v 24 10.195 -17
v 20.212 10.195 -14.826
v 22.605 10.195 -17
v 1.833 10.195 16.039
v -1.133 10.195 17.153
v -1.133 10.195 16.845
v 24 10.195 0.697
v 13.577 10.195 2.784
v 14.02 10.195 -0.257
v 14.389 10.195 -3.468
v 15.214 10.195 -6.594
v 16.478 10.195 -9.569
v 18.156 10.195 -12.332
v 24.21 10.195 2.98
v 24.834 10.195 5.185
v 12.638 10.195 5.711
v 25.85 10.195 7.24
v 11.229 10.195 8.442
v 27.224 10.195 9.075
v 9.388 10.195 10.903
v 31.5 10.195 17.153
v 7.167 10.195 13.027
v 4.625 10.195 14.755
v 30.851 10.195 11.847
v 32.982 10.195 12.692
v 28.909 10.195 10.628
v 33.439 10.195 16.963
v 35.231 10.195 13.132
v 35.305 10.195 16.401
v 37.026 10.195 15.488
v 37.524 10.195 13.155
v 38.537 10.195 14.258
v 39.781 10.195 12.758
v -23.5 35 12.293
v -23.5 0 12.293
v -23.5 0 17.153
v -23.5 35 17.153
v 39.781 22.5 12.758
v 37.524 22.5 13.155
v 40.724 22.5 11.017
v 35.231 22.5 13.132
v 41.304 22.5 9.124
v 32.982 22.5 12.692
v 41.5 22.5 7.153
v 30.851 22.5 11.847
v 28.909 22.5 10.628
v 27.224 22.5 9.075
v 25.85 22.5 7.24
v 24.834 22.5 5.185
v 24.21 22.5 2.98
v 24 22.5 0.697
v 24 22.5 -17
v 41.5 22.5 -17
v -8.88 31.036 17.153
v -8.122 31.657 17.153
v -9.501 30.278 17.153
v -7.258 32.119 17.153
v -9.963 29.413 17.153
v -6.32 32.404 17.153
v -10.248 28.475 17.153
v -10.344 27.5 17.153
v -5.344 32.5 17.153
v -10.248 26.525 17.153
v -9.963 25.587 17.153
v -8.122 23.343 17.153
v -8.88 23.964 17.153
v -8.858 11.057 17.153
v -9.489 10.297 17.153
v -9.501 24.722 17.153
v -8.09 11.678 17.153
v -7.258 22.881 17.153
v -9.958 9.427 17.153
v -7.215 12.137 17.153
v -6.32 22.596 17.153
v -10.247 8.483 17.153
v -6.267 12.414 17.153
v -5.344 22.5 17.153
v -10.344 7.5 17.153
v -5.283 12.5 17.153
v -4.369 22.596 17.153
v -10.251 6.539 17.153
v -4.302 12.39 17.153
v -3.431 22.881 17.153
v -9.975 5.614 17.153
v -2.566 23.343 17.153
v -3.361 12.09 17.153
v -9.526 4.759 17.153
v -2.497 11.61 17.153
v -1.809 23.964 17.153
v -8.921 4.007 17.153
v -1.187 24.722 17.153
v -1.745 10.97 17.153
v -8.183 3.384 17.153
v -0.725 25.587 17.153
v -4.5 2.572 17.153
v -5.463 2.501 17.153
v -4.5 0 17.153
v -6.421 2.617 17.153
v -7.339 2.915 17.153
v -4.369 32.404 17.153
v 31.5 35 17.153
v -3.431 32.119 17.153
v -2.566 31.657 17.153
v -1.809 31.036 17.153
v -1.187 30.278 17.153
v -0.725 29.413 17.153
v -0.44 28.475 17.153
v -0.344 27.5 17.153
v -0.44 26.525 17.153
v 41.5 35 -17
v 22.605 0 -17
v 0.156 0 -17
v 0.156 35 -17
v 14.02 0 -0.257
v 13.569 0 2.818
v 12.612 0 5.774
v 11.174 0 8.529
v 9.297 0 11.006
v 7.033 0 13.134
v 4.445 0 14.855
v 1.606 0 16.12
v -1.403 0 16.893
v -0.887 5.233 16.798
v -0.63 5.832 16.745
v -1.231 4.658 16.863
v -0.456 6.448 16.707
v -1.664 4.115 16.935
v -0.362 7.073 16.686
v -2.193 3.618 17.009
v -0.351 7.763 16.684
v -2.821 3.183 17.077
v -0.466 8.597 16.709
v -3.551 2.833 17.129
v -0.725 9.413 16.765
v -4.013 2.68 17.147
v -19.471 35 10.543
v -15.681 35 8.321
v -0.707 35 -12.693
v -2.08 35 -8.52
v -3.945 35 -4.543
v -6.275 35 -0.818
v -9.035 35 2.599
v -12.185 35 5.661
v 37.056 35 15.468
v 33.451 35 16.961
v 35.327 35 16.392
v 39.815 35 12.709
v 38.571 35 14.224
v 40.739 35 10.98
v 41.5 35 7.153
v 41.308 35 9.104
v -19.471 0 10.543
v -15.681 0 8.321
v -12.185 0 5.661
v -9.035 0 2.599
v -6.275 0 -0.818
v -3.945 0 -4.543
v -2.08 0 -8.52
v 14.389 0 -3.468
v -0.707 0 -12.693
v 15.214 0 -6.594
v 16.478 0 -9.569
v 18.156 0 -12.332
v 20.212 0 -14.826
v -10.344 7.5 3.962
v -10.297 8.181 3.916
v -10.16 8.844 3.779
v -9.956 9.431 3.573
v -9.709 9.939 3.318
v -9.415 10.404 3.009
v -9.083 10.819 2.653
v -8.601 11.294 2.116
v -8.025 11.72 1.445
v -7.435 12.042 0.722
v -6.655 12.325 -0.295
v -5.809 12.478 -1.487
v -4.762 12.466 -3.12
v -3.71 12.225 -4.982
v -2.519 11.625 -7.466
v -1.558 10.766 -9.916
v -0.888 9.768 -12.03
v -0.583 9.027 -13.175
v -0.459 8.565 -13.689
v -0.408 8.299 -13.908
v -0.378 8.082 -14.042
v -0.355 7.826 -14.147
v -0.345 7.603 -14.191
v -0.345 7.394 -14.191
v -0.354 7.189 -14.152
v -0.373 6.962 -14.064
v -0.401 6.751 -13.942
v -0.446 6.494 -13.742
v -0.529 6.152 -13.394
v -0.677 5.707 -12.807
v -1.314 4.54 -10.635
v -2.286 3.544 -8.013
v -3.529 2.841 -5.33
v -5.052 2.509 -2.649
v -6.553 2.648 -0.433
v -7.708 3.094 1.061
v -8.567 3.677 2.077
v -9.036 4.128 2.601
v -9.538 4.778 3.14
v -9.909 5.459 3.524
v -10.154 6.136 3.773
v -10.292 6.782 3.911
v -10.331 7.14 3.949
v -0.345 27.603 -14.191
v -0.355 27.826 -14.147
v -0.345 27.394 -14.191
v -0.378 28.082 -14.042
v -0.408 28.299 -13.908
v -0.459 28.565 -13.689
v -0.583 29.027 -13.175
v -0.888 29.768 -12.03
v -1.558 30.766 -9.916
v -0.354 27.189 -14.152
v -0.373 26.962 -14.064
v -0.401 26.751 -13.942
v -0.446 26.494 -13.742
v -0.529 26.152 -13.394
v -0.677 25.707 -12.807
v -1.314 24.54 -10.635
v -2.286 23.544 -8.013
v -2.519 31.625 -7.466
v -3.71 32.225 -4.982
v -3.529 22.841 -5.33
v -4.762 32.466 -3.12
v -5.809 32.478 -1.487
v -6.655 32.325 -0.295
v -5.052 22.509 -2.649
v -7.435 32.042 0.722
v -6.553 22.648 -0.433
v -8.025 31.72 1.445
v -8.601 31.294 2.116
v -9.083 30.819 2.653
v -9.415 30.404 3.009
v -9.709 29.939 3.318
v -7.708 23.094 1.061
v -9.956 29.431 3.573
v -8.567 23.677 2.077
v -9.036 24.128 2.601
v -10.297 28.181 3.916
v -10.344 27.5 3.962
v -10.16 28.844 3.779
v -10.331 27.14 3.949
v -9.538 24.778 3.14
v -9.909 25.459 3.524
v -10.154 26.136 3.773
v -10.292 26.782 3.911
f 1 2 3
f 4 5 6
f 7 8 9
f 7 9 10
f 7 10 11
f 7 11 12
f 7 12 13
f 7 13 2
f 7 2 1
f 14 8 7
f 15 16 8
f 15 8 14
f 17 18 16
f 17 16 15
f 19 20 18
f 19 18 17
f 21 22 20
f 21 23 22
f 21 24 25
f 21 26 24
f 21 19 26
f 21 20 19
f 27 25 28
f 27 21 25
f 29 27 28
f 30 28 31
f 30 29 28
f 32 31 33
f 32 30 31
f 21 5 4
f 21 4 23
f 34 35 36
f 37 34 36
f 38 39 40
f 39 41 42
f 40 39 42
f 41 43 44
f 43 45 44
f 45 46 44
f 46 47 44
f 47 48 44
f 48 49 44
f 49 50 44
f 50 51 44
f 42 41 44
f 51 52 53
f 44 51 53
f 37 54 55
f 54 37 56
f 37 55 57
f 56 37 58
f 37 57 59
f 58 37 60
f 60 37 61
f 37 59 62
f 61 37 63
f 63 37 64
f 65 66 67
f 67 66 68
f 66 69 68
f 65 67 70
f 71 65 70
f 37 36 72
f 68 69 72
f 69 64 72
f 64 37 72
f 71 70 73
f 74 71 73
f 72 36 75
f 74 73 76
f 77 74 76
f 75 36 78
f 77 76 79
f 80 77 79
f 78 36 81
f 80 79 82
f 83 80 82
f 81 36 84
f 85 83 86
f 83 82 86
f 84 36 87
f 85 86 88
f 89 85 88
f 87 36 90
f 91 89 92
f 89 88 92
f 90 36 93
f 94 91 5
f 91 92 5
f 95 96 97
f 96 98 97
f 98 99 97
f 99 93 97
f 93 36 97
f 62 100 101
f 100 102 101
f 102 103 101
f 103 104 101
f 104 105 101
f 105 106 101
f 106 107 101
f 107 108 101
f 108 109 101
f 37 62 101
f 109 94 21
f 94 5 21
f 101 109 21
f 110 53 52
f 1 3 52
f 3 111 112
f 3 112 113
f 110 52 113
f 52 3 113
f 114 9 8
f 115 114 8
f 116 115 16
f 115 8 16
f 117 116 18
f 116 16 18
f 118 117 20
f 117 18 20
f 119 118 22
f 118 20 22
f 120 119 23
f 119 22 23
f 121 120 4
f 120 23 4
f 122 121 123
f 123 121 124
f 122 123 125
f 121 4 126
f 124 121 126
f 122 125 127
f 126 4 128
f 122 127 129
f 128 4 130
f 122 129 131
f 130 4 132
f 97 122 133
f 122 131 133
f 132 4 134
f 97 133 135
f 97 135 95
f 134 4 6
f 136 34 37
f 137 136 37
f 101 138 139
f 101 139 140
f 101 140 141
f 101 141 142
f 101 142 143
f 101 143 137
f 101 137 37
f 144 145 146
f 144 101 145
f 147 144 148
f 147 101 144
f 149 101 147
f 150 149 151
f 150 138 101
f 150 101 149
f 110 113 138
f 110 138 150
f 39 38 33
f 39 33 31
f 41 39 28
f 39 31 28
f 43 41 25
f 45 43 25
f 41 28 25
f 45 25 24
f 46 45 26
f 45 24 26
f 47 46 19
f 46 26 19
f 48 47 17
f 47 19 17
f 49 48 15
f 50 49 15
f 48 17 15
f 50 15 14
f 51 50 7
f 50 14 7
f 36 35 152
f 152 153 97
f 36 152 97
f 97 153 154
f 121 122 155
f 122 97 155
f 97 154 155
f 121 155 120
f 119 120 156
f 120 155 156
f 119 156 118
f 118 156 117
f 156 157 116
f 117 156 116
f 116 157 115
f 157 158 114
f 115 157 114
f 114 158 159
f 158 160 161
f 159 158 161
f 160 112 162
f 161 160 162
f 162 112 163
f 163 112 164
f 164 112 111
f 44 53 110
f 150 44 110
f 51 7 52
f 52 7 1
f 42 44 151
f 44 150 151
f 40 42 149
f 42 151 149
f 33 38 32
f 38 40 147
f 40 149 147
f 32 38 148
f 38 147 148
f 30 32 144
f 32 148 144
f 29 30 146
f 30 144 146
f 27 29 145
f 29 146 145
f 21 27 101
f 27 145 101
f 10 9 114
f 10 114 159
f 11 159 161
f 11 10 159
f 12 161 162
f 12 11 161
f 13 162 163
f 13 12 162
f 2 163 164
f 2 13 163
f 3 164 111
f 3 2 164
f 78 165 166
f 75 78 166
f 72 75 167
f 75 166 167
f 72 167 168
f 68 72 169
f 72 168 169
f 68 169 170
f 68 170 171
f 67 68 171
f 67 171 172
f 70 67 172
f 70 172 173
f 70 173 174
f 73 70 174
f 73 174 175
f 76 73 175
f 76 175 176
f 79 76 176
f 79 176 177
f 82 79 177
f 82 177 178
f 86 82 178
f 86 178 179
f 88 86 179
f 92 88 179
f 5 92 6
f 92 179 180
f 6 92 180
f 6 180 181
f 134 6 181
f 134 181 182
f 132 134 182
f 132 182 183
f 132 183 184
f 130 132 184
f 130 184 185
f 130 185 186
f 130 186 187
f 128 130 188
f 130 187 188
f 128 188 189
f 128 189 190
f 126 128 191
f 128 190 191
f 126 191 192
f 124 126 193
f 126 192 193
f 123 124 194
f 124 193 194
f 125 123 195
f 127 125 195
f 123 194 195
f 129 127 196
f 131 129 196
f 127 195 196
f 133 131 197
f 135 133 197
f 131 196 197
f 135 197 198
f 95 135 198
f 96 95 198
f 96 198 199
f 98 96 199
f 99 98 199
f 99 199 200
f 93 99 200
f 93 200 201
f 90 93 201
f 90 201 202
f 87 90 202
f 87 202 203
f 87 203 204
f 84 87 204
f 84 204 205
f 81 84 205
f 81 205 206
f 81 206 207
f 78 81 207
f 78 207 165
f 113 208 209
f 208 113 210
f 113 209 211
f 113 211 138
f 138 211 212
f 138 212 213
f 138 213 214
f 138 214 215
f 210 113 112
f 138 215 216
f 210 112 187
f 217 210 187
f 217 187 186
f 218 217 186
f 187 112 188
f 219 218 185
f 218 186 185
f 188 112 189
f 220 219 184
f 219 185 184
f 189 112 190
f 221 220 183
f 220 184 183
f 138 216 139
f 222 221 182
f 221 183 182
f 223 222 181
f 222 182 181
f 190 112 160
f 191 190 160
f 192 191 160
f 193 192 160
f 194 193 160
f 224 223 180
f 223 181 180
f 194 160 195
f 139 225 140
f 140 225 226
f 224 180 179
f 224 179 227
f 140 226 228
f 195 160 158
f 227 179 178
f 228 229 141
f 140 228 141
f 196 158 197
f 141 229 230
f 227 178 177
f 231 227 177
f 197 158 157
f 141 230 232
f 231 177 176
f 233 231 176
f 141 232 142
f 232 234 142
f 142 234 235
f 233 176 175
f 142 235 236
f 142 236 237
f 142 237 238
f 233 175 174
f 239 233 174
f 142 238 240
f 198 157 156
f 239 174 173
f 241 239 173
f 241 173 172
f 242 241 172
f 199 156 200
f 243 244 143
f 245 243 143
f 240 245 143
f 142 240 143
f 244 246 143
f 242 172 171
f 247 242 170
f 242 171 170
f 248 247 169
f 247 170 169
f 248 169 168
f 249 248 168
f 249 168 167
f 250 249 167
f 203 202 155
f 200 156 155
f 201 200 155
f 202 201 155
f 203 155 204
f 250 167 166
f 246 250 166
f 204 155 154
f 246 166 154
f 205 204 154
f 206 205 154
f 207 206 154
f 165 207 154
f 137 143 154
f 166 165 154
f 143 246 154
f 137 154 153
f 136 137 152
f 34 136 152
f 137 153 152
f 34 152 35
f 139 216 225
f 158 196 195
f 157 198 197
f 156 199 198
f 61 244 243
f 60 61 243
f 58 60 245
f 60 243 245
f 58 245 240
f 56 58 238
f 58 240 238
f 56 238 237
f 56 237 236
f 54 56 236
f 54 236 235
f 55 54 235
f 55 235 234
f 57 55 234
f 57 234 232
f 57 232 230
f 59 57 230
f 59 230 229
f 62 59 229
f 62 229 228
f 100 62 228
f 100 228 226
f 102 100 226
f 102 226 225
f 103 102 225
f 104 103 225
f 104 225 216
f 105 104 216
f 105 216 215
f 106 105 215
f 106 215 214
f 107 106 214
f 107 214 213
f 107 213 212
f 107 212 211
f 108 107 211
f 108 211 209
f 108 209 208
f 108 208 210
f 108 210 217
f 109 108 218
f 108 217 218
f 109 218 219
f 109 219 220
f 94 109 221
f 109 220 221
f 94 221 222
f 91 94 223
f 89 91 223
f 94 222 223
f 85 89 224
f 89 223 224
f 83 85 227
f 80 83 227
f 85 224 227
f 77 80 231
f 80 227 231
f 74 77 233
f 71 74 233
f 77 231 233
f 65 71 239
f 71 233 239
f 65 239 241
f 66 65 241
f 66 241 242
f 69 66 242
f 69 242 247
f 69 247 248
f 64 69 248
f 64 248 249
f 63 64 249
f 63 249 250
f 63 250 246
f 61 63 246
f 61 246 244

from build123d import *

# Parameters (mm, degrees)
BOSS_EXTRUDE1_DEPTH = 35
SKETCH2_W           = 17.696874766
SKETCH2_H           = 12.5
BOSS_EXTRUDE2_DEPTH = 17.5
BOSS_EXTRUDE3_REACH = 59.1
SKETCH3_W           = 17.576942212
SKETCH3_H           = 12.5
SKETCH6_R           = 5
CUT_EXTRUDE4_DEPTH  = 34.153314003
CUT_EXTRUDE5_START  = -10.195
SKETCH7_R           = 22.5
CUT_EXTRUDE5_DEPTH  = 10.195
CUT_EXTRUDE6_START  = -10.195
CUT_EXTRUDE6_DEPTH  = 10.195
FILLET1_R           = 10


with BuildPart() as part:
    # Sketch1 → Boss-Extrude1 (new body)
    with BuildSketch(Plane(origin=(0, 0, 0), x_dir=(1, 0, 0), z_dir=(0, 1, 0))):
        with BuildLine():
            Line((-23.500000002, -12.2928564), (-23.500000002, -17.153314003))
            Line((-23.500000002, -17.153314003), (41.499999998, -17.153314003))
            Line((41.499999998, -17.153314003), (41.499999998, -12.153314003))
            ThreePointArc((41.499999998, -12.153314003), (29.653468029, -11.155125098), (23.999999998, -0.696874766))
            Line((23.999999998, -0.696874766), (23.999999998, 17))
            Line((23.999999998, 17), (0.15591238, 17))
            ThreePointArc((0.15591238, 17), (-7.603392609, -0.932132231), (-23.500000002, -12.2928564))
        make_face()
    extrude(amount=BOSS_EXTRUDE1_DEPTH)

    # Sketch2 → Boss-Extrude2 (add)
    with BuildSketch(Plane(origin=(23.999999998, 0, 0), x_dir=(0, 0, -1), z_dir=(1, 0, 0))):
        with Locations((8.151562617, 28.75)):
            Rectangle(SKETCH2_W, SKETCH2_H)
    extrude(amount=BOSS_EXTRUDE2_DEPTH)

    # Sketch3 → Boss-Extrude3 (add, up to next)
    with BuildSketch(Plane.XY.offset(0.696874766), mode=Mode.PRIVATE) as boss_extrude3_sk1:
        with Locations((32.711528892, 28.75)):
            Rectangle(SKETCH3_W, SKETCH3_H)
    boss_extrude3_tool1 = extrude(boss_extrude3_sk1.sketch, amount=BOSS_EXTRUDE3_REACH, mode=Mode.PRIVATE) - part.part
    add(boss_extrude3_tool1.solids().sort_by_distance((32.711529, 28.75, 0.696875))[0])

    # Sketch6 → Cut-Extrude4 (cut)
    with BuildSketch(Plane(origin=(0, 0, -17), x_dir=(-1, 0, 0), z_dir=(0, 0, -1))):
        with Locations((5.34408762, 7.5)):
            Circle(SKETCH6_R)
        with Locations((5.34408762, 27.5)):
            Circle(SKETCH6_R)
    extrude(amount=-CUT_EXTRUDE4_DEPTH, mode=Mode.SUBTRACT)

    # Sketch7 → Cut-Extrude5 (cut)
    with BuildSketch(Plane.XZ.offset(CUT_EXTRUDE5_START)):
        with Locations((36.499999998, 0.696874766)):
            Circle(SKETCH7_R)
    extrude(amount=CUT_EXTRUDE5_DEPTH, mode=Mode.SUBTRACT)

    # Sketch8 → Cut-Extrude6 (cut)
    with BuildSketch(Plane.XZ.offset(CUT_EXTRUDE6_START)):
        with BuildLine():
            Line((-4.500000002, 17.153314003), (41.499999998, 17.153314003))
            Line((41.499999998, 17.153314003), (41.499999998, -17))
            Line((41.499999998, -17), (22.605014445, -17))
            Line((22.605014445, -17), (14.020220559, -0.256810916))
            ThreePointArc((14.020220559, -0.256810916), (8.209356978, 12.117427379), (-4.500000002, 17.153314003))
        make_face()
    extrude(amount=CUT_EXTRUDE6_DEPTH, mode=Mode.SUBTRACT)

    # Fillet1
    fillet1_edges = [part.edges().sort_by_distance(p)[0] for p in [
        (41.499999998, 22.5975, 17.153314003),
    ]]
    fillet(fillet1_edges, radius=FILLET1_R)


solid = part.part
